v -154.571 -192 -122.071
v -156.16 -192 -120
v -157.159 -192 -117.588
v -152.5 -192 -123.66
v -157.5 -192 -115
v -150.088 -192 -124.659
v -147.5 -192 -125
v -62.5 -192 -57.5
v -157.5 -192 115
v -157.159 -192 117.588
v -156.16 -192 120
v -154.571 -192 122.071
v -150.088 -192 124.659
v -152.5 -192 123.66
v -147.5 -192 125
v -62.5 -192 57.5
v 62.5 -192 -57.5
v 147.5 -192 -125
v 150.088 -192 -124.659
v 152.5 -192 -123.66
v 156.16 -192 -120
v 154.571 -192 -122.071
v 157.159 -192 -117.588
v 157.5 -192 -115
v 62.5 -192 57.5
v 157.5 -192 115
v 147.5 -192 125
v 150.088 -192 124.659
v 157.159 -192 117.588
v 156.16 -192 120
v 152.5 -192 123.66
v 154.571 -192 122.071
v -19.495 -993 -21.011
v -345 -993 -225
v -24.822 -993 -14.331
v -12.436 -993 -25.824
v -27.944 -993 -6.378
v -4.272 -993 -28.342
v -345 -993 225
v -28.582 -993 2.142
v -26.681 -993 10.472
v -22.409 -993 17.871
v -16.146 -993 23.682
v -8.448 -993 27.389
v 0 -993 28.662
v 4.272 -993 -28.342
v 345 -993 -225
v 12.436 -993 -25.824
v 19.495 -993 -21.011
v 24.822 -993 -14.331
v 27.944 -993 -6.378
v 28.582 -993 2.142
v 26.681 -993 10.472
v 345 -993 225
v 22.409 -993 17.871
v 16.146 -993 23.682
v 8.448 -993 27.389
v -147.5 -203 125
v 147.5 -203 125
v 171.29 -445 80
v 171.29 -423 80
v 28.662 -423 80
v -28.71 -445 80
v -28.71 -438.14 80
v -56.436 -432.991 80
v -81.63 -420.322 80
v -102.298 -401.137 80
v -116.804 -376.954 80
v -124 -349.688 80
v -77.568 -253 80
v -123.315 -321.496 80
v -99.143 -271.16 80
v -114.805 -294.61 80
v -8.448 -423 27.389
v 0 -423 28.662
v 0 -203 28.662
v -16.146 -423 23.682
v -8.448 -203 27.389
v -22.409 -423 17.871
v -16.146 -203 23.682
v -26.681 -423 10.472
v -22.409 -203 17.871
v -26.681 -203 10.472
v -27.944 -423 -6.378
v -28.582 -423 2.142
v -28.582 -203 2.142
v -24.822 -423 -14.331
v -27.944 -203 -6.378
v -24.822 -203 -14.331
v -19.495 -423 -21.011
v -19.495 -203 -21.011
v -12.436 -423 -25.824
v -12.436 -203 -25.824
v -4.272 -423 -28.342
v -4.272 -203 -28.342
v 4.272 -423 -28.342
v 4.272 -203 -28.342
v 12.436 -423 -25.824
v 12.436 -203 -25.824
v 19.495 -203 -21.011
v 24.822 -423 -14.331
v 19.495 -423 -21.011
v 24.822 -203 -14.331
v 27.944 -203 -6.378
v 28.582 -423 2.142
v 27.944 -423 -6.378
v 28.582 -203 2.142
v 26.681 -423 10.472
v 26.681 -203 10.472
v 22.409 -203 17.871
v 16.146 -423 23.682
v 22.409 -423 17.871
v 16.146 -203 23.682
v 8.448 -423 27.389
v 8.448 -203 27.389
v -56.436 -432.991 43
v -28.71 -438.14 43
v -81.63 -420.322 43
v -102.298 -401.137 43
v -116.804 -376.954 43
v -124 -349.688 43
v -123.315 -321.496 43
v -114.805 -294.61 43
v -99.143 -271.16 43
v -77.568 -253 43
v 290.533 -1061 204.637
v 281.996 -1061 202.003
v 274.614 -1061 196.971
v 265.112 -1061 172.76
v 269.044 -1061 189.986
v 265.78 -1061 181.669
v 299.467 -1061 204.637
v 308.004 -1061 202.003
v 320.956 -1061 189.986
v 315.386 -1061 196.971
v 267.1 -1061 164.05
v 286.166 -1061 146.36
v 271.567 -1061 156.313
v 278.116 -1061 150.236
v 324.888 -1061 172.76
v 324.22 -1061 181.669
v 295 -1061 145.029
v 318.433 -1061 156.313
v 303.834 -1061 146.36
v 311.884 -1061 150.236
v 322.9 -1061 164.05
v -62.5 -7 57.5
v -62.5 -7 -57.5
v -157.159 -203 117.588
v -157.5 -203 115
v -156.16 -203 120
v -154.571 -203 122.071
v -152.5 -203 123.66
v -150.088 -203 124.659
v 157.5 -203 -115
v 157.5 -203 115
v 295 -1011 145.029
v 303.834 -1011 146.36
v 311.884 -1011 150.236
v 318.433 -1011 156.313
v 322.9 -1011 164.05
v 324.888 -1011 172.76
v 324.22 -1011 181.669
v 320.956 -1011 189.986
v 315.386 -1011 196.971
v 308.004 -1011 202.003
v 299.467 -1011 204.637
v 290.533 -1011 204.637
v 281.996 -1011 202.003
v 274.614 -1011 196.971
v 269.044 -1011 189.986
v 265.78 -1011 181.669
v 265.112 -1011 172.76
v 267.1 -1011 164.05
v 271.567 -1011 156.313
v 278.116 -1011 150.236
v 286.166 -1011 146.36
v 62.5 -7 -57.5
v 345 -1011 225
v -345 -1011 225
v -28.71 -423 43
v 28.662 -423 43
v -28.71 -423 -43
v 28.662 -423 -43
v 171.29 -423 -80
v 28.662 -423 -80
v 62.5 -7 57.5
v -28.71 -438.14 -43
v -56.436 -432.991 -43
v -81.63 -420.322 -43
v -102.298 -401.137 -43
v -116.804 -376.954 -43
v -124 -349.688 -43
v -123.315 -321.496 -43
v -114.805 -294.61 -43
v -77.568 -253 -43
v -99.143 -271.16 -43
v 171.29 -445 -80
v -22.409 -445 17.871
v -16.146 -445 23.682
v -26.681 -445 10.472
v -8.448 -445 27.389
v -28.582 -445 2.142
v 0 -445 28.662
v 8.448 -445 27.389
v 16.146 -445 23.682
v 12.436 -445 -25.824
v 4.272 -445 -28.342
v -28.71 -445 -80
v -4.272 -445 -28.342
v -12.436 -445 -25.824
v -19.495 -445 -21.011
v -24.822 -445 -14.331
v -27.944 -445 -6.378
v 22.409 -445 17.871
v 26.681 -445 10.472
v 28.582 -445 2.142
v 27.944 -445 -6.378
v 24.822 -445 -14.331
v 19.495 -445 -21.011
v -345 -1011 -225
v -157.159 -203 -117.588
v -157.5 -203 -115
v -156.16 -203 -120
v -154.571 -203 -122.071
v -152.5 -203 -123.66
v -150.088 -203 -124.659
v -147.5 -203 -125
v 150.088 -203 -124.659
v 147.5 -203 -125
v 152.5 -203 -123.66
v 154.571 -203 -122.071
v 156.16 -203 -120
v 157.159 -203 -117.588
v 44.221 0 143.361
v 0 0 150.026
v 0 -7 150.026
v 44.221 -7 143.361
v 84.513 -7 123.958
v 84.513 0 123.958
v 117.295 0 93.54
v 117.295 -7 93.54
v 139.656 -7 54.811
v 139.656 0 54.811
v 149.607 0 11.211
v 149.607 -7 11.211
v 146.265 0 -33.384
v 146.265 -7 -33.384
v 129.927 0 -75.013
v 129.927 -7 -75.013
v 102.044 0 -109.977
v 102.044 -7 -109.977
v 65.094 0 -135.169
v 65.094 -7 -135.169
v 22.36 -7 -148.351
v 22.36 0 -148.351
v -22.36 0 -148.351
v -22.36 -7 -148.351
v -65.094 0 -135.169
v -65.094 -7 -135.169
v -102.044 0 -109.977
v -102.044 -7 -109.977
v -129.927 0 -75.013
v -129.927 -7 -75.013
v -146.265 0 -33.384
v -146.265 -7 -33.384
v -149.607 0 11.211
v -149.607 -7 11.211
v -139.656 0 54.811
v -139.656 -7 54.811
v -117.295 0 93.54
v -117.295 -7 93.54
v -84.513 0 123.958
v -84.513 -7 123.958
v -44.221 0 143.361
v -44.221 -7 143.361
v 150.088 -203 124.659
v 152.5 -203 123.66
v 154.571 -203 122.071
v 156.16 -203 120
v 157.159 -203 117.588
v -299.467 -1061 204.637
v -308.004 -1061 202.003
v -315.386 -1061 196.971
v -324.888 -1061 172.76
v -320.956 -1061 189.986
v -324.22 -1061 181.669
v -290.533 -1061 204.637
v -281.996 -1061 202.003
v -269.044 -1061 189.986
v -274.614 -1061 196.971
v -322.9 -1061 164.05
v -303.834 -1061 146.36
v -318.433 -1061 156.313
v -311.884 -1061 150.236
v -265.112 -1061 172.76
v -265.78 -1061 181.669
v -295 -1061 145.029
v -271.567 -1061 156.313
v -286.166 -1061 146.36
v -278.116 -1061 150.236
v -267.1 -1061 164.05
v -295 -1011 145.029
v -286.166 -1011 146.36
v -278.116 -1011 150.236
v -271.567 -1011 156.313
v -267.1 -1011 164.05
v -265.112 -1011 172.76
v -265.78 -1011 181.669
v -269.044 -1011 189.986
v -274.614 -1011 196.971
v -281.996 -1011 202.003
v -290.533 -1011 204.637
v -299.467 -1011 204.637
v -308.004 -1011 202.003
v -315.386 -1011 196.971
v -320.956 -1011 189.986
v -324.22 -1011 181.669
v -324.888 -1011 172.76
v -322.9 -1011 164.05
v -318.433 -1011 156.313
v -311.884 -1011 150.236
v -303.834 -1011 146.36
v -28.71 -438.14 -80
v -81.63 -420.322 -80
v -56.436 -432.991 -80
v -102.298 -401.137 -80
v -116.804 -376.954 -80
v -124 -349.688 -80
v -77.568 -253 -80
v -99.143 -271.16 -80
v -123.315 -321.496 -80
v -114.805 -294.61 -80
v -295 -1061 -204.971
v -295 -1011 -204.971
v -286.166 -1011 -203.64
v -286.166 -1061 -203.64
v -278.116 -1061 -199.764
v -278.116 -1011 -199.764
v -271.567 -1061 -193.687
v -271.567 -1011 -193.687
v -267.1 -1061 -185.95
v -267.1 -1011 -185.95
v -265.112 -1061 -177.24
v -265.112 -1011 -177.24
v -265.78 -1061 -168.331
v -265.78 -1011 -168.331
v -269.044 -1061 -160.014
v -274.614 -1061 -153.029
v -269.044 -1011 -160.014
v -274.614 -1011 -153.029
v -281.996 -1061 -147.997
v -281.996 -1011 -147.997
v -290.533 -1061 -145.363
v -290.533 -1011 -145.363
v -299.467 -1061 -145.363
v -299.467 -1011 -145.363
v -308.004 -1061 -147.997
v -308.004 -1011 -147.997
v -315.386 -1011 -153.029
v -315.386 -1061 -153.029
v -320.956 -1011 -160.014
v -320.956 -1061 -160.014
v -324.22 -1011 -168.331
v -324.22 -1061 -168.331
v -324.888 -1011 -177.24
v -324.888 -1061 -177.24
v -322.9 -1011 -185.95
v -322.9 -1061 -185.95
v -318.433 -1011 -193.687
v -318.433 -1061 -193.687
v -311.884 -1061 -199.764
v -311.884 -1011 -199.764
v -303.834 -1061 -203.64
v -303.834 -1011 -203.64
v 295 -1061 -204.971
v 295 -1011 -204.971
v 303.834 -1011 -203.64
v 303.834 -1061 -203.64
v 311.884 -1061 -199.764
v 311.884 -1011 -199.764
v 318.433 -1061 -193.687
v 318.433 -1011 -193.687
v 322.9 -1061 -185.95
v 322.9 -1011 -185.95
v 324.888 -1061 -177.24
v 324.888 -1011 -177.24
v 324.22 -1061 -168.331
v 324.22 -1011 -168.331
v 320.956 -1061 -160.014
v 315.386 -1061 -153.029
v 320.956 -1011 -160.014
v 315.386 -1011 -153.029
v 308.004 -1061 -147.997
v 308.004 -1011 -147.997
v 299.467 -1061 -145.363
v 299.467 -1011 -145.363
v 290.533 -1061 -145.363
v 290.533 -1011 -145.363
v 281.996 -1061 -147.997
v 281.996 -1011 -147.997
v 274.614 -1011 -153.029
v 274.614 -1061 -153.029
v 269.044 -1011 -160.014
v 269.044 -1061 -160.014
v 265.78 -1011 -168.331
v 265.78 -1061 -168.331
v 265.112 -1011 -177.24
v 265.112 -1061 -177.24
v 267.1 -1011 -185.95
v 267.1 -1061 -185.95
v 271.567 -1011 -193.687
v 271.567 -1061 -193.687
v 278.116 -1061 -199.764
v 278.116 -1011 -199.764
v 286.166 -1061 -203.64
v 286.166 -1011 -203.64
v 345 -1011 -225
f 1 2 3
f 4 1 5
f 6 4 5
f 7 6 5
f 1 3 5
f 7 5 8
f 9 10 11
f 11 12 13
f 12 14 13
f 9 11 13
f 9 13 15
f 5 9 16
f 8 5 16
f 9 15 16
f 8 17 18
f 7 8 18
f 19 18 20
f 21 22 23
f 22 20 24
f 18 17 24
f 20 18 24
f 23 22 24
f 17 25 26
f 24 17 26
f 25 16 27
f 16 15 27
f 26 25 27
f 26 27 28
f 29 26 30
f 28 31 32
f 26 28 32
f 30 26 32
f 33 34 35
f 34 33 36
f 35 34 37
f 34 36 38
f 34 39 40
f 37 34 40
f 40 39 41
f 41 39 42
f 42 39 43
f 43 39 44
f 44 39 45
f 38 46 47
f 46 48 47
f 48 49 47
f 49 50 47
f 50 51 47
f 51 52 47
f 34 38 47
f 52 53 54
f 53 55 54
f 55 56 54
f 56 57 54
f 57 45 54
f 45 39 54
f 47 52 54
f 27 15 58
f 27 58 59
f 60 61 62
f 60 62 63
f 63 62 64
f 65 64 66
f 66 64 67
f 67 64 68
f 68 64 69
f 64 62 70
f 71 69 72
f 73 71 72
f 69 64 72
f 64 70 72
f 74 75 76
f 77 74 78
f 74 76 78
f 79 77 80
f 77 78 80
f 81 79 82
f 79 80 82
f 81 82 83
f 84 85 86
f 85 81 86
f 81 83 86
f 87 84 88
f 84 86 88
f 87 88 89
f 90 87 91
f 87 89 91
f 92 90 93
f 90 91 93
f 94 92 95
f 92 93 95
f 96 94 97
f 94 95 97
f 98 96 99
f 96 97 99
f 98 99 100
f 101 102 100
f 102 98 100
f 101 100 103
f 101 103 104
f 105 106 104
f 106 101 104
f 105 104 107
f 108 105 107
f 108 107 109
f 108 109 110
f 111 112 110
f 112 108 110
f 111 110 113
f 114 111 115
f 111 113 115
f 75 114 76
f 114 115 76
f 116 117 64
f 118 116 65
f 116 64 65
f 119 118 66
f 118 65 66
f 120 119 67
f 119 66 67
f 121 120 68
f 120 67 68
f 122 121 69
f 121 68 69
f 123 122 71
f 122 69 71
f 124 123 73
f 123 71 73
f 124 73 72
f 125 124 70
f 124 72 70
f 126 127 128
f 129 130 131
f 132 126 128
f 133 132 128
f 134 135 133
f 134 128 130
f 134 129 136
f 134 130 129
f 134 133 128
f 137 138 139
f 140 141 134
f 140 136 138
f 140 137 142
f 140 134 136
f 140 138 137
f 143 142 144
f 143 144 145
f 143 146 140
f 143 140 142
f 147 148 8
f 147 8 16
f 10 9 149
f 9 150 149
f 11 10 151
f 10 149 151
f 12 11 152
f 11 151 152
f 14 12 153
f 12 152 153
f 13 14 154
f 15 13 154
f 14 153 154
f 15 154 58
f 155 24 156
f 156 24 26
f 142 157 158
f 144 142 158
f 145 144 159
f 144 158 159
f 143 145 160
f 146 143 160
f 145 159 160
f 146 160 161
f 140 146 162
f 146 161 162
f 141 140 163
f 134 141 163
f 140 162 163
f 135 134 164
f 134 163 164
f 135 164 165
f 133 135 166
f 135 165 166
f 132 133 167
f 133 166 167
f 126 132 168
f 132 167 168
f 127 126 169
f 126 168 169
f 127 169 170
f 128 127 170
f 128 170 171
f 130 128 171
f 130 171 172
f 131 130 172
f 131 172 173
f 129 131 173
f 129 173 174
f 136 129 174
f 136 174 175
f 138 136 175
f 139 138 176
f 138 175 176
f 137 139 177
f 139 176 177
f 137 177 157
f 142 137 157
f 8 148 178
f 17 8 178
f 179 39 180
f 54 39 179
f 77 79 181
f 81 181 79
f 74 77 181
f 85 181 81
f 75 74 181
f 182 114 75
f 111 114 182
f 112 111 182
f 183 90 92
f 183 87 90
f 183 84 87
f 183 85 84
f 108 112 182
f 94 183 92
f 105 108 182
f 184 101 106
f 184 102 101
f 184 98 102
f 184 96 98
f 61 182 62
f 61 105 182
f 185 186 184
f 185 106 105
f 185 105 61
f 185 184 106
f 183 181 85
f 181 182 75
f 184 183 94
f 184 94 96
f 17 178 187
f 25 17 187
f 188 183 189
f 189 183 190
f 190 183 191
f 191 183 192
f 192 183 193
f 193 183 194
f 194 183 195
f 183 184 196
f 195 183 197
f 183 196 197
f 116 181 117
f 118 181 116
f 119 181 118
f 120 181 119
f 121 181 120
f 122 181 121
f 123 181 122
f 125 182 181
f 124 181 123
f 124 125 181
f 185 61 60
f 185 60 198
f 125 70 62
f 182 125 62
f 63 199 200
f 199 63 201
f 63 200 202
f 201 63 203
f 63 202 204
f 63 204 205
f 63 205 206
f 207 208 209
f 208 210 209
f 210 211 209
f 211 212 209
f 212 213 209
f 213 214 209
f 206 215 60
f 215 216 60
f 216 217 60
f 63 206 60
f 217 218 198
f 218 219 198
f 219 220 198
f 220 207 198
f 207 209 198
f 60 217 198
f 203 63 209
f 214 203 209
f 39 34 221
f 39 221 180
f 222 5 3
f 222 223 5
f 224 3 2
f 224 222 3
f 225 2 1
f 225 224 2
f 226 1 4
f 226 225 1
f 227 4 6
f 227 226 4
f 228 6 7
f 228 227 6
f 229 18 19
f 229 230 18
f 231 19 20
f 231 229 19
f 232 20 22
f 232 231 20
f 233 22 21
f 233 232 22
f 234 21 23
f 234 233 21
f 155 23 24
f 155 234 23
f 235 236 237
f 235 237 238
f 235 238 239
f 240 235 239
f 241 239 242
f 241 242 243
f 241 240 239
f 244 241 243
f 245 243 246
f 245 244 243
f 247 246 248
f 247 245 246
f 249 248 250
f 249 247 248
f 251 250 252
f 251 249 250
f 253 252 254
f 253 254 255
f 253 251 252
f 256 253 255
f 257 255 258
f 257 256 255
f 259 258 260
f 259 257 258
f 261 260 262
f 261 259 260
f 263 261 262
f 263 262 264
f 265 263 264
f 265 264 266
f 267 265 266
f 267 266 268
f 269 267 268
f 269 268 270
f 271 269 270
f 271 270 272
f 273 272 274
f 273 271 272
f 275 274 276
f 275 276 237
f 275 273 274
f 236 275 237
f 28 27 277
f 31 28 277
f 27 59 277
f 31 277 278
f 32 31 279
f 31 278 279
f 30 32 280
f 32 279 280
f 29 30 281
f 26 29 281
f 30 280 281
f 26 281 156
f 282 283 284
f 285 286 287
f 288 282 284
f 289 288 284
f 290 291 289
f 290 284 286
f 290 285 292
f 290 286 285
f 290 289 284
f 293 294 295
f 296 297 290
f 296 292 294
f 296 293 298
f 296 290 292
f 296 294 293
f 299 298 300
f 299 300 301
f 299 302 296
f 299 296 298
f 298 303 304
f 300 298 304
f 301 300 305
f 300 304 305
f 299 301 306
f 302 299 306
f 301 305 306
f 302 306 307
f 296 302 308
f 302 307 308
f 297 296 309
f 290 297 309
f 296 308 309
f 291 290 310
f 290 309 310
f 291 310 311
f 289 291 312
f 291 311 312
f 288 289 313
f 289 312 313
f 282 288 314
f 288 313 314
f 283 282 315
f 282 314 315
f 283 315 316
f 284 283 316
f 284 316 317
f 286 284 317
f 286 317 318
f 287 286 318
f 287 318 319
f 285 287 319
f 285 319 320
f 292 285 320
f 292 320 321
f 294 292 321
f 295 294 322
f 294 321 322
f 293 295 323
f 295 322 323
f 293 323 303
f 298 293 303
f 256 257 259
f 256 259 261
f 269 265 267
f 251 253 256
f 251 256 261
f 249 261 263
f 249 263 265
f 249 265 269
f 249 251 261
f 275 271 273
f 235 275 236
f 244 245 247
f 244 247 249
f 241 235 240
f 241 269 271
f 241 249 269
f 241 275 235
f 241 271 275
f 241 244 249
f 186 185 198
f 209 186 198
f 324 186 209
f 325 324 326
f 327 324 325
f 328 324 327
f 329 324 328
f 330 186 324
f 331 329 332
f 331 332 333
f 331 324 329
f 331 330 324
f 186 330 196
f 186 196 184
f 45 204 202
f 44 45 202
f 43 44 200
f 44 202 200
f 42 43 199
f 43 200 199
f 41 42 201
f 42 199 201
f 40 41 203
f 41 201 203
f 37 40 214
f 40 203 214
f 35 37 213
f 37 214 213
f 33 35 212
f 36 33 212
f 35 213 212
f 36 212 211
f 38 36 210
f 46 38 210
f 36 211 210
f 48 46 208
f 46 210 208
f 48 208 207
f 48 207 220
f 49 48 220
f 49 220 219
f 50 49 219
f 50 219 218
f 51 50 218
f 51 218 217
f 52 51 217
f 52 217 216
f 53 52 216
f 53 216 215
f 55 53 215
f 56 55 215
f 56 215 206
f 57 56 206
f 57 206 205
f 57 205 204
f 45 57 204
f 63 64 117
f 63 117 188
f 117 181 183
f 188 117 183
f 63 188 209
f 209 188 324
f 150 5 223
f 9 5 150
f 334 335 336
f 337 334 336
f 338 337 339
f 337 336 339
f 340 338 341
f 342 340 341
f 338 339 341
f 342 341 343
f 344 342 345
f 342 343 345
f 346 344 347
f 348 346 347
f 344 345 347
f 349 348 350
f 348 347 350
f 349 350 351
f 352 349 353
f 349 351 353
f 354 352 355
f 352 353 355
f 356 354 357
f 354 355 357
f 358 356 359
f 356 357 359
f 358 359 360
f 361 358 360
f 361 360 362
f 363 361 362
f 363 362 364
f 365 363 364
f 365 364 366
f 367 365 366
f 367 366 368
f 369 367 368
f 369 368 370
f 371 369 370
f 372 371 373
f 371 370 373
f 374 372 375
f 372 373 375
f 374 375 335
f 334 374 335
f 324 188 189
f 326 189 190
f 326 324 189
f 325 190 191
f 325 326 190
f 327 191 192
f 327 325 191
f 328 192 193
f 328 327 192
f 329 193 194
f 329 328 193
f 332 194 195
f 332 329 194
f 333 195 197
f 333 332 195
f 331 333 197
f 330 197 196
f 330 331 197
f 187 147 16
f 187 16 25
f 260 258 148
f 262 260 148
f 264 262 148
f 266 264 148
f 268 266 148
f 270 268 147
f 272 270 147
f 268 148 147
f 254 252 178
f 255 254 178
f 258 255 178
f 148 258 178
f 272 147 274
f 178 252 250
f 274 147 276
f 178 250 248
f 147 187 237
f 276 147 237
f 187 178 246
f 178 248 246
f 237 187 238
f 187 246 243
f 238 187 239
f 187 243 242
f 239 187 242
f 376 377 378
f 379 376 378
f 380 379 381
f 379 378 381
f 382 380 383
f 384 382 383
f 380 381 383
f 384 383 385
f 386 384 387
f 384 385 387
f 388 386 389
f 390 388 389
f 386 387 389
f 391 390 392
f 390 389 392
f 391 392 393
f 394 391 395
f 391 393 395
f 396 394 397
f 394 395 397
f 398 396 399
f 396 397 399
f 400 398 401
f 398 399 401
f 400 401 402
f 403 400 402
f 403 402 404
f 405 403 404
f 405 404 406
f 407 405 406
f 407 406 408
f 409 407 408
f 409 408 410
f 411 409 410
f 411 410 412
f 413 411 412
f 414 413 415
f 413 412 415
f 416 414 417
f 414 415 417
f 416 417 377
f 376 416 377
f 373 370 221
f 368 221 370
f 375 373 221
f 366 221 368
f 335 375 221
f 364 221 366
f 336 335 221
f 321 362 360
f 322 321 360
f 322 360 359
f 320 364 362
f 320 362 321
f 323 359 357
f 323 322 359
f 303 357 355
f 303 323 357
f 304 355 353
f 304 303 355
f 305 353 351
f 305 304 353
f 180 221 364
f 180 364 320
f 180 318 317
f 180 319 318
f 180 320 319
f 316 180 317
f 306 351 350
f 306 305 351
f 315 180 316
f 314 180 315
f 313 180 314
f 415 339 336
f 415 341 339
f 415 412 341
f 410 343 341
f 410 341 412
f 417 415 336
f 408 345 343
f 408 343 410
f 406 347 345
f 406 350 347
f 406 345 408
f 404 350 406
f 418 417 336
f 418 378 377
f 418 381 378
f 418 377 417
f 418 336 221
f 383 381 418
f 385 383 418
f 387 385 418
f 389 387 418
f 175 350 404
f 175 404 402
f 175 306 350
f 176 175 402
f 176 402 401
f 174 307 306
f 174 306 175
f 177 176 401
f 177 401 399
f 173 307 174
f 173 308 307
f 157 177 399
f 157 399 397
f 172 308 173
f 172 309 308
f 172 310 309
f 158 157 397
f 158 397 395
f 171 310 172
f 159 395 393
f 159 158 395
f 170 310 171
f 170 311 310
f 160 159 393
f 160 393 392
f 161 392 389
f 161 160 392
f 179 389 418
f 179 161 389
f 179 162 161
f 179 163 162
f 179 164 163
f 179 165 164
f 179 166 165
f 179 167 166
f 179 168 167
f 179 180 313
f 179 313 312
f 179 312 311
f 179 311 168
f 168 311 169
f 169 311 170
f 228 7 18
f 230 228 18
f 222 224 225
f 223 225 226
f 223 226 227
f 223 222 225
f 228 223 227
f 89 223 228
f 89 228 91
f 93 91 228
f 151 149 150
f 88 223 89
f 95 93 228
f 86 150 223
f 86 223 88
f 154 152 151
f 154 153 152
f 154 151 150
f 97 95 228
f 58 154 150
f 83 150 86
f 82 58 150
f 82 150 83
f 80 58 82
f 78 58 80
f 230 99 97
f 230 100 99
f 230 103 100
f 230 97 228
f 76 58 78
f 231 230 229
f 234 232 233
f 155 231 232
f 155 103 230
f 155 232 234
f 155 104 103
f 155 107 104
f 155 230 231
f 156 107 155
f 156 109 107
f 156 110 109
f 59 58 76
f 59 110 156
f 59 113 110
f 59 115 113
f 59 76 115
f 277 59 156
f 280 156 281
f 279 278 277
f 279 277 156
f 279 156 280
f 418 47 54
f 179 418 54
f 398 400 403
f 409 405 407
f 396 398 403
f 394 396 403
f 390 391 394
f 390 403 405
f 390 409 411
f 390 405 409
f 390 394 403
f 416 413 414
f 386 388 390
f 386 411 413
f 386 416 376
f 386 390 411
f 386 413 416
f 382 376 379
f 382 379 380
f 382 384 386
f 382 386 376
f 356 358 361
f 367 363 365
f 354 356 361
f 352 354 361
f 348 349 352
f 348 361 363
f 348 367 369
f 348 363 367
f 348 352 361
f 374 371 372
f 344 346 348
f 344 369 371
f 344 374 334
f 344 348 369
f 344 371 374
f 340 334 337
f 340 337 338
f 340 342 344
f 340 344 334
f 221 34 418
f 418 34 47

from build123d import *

# Parameters (mm, degrees)
SKETCH2_R           = 150.026309836
BOSS_EXTRUDE1_DEPTH = 7
SKETCH3_W           = 125
SKETCH3_H           = 115
BOSS_EXTRUDE2_DEPTH = 185
SKETCH4_W           = 315
SKETCH4_H           = 250
BOSS_EXTRUDE3_DEPTH = 11
SKETCH5_R           = 28.662420382
BOSS_EXTRUDE4_DEPTH = 790
SKETCH6_W           = 690
SKETCH6_H           = 450
BOSS_EXTRUDE5_DEPTH = 18
SKETCH7_R           = 29.971446918
BOSS_EXTRUDE6_DEPTH = 50
BOSS_EXTRUDE7_DEPTH = 22
BOSS_EXTRUDE8_DEPTH = 37
FILLET1_R           = 10


with BuildPart() as part:
    # Sketch2 → Boss-Extrude1 (new body)
    with BuildSketch(Plane(origin=(0, 0, 0), x_dir=(1, 0, 0), z_dir=(0, 1, 0))):
        with Locations(Location((0, 0, 0), (0, 0, 270))):
            Circle(SKETCH2_R)
    extrude(amount=-BOSS_EXTRUDE1_DEPTH)

    # Sketch3 → Boss-Extrude2 (add)
    with BuildSketch(Plane.XZ.offset(7)):
        Rectangle(SKETCH3_W, SKETCH3_H)
    extrude(amount=BOSS_EXTRUDE2_DEPTH)

    # Sketch4 → Boss-Extrude3 (add)
    with BuildSketch(Plane.XZ.offset(192)):
        Rectangle(SKETCH4_W, SKETCH4_H)
    extrude(amount=BOSS_EXTRUDE3_DEPTH)

    # Sketch5 → Boss-Extrude4 (add)
    with BuildSketch(Plane.XZ.offset(203)):
        with Locations(Location((0, 0, 0), (0, 0, 90))):
            Circle(SKETCH5_R)
    extrude(amount=BOSS_EXTRUDE4_DEPTH)

    # Sketch6 → Boss-Extrude5 (add)
    with BuildSketch(Plane.XZ.offset(993)):
        Rectangle(SKETCH6_W, SKETCH6_H)
    extrude(amount=BOSS_EXTRUDE5_DEPTH)

    # Sketch7 → Boss-Extrude6 (add)
    with BuildSketch(Plane.XZ.offset(1011)):
        with Locations(Location((-295, 175, 0), (0, 0, 270))):
            Circle(SKETCH7_R)
        with Locations(Location((-295, -175, 0), (0, 0, 270))):
            Circle(SKETCH7_R)
        with Locations(Location((295, 175, 0), (0, 0, 270))):
            Circle(SKETCH7_R)
        with Locations(Location((295, -175, 0), (0, 0, 270))):
            Circle(SKETCH7_R)
    extrude(amount=BOSS_EXTRUDE6_DEPTH)

    # Sketch11 → Boss-Extrude7 (add)
    with BuildSketch(Plane(origin=(0, -423, 0), x_dir=(-1, 0, 0), z_dir=(0, -1, 0))):
        Polygon((28.709807748, 0), (28.709807748, -80), (-171.290192252, -80), (-171.290192252, 80), (28.709807748, 80), align=None)
    extrude(amount=BOSS_EXTRUDE7_DEPTH)

    # Sketch12 → Boss-Extrude8 (add)
    with BuildSketch(Plane.XY.offset(80)):
        with BuildLine():
            Line((-77.568003655, -253), (28.662420382, -423))
            ThreePointArc((28.662420382, -423), (-109.452791637, -391.115212019), (-77.568003655, -253))
        make_face()
    boss_extrude8 = extrude(amount=-BOSS_EXTRUDE8_DEPTH)

    # Mirror1: Boss-Extrude8 across plane
    add(boss_extrude8.mirror(Plane.XY))

    # Fillet1
    fillet1_edges = [part.edges().sort_by_distance(p)[0] for p in [
        (-157.5, -197.5, 125),
        (-157.5, -197.5, -125),
        (157.5, -197.5, -125),
        (157.5, -197.5, 125),
    ]]
    fillet(fillet1_edges, radius=FILLET1_R)


solid = part.part
